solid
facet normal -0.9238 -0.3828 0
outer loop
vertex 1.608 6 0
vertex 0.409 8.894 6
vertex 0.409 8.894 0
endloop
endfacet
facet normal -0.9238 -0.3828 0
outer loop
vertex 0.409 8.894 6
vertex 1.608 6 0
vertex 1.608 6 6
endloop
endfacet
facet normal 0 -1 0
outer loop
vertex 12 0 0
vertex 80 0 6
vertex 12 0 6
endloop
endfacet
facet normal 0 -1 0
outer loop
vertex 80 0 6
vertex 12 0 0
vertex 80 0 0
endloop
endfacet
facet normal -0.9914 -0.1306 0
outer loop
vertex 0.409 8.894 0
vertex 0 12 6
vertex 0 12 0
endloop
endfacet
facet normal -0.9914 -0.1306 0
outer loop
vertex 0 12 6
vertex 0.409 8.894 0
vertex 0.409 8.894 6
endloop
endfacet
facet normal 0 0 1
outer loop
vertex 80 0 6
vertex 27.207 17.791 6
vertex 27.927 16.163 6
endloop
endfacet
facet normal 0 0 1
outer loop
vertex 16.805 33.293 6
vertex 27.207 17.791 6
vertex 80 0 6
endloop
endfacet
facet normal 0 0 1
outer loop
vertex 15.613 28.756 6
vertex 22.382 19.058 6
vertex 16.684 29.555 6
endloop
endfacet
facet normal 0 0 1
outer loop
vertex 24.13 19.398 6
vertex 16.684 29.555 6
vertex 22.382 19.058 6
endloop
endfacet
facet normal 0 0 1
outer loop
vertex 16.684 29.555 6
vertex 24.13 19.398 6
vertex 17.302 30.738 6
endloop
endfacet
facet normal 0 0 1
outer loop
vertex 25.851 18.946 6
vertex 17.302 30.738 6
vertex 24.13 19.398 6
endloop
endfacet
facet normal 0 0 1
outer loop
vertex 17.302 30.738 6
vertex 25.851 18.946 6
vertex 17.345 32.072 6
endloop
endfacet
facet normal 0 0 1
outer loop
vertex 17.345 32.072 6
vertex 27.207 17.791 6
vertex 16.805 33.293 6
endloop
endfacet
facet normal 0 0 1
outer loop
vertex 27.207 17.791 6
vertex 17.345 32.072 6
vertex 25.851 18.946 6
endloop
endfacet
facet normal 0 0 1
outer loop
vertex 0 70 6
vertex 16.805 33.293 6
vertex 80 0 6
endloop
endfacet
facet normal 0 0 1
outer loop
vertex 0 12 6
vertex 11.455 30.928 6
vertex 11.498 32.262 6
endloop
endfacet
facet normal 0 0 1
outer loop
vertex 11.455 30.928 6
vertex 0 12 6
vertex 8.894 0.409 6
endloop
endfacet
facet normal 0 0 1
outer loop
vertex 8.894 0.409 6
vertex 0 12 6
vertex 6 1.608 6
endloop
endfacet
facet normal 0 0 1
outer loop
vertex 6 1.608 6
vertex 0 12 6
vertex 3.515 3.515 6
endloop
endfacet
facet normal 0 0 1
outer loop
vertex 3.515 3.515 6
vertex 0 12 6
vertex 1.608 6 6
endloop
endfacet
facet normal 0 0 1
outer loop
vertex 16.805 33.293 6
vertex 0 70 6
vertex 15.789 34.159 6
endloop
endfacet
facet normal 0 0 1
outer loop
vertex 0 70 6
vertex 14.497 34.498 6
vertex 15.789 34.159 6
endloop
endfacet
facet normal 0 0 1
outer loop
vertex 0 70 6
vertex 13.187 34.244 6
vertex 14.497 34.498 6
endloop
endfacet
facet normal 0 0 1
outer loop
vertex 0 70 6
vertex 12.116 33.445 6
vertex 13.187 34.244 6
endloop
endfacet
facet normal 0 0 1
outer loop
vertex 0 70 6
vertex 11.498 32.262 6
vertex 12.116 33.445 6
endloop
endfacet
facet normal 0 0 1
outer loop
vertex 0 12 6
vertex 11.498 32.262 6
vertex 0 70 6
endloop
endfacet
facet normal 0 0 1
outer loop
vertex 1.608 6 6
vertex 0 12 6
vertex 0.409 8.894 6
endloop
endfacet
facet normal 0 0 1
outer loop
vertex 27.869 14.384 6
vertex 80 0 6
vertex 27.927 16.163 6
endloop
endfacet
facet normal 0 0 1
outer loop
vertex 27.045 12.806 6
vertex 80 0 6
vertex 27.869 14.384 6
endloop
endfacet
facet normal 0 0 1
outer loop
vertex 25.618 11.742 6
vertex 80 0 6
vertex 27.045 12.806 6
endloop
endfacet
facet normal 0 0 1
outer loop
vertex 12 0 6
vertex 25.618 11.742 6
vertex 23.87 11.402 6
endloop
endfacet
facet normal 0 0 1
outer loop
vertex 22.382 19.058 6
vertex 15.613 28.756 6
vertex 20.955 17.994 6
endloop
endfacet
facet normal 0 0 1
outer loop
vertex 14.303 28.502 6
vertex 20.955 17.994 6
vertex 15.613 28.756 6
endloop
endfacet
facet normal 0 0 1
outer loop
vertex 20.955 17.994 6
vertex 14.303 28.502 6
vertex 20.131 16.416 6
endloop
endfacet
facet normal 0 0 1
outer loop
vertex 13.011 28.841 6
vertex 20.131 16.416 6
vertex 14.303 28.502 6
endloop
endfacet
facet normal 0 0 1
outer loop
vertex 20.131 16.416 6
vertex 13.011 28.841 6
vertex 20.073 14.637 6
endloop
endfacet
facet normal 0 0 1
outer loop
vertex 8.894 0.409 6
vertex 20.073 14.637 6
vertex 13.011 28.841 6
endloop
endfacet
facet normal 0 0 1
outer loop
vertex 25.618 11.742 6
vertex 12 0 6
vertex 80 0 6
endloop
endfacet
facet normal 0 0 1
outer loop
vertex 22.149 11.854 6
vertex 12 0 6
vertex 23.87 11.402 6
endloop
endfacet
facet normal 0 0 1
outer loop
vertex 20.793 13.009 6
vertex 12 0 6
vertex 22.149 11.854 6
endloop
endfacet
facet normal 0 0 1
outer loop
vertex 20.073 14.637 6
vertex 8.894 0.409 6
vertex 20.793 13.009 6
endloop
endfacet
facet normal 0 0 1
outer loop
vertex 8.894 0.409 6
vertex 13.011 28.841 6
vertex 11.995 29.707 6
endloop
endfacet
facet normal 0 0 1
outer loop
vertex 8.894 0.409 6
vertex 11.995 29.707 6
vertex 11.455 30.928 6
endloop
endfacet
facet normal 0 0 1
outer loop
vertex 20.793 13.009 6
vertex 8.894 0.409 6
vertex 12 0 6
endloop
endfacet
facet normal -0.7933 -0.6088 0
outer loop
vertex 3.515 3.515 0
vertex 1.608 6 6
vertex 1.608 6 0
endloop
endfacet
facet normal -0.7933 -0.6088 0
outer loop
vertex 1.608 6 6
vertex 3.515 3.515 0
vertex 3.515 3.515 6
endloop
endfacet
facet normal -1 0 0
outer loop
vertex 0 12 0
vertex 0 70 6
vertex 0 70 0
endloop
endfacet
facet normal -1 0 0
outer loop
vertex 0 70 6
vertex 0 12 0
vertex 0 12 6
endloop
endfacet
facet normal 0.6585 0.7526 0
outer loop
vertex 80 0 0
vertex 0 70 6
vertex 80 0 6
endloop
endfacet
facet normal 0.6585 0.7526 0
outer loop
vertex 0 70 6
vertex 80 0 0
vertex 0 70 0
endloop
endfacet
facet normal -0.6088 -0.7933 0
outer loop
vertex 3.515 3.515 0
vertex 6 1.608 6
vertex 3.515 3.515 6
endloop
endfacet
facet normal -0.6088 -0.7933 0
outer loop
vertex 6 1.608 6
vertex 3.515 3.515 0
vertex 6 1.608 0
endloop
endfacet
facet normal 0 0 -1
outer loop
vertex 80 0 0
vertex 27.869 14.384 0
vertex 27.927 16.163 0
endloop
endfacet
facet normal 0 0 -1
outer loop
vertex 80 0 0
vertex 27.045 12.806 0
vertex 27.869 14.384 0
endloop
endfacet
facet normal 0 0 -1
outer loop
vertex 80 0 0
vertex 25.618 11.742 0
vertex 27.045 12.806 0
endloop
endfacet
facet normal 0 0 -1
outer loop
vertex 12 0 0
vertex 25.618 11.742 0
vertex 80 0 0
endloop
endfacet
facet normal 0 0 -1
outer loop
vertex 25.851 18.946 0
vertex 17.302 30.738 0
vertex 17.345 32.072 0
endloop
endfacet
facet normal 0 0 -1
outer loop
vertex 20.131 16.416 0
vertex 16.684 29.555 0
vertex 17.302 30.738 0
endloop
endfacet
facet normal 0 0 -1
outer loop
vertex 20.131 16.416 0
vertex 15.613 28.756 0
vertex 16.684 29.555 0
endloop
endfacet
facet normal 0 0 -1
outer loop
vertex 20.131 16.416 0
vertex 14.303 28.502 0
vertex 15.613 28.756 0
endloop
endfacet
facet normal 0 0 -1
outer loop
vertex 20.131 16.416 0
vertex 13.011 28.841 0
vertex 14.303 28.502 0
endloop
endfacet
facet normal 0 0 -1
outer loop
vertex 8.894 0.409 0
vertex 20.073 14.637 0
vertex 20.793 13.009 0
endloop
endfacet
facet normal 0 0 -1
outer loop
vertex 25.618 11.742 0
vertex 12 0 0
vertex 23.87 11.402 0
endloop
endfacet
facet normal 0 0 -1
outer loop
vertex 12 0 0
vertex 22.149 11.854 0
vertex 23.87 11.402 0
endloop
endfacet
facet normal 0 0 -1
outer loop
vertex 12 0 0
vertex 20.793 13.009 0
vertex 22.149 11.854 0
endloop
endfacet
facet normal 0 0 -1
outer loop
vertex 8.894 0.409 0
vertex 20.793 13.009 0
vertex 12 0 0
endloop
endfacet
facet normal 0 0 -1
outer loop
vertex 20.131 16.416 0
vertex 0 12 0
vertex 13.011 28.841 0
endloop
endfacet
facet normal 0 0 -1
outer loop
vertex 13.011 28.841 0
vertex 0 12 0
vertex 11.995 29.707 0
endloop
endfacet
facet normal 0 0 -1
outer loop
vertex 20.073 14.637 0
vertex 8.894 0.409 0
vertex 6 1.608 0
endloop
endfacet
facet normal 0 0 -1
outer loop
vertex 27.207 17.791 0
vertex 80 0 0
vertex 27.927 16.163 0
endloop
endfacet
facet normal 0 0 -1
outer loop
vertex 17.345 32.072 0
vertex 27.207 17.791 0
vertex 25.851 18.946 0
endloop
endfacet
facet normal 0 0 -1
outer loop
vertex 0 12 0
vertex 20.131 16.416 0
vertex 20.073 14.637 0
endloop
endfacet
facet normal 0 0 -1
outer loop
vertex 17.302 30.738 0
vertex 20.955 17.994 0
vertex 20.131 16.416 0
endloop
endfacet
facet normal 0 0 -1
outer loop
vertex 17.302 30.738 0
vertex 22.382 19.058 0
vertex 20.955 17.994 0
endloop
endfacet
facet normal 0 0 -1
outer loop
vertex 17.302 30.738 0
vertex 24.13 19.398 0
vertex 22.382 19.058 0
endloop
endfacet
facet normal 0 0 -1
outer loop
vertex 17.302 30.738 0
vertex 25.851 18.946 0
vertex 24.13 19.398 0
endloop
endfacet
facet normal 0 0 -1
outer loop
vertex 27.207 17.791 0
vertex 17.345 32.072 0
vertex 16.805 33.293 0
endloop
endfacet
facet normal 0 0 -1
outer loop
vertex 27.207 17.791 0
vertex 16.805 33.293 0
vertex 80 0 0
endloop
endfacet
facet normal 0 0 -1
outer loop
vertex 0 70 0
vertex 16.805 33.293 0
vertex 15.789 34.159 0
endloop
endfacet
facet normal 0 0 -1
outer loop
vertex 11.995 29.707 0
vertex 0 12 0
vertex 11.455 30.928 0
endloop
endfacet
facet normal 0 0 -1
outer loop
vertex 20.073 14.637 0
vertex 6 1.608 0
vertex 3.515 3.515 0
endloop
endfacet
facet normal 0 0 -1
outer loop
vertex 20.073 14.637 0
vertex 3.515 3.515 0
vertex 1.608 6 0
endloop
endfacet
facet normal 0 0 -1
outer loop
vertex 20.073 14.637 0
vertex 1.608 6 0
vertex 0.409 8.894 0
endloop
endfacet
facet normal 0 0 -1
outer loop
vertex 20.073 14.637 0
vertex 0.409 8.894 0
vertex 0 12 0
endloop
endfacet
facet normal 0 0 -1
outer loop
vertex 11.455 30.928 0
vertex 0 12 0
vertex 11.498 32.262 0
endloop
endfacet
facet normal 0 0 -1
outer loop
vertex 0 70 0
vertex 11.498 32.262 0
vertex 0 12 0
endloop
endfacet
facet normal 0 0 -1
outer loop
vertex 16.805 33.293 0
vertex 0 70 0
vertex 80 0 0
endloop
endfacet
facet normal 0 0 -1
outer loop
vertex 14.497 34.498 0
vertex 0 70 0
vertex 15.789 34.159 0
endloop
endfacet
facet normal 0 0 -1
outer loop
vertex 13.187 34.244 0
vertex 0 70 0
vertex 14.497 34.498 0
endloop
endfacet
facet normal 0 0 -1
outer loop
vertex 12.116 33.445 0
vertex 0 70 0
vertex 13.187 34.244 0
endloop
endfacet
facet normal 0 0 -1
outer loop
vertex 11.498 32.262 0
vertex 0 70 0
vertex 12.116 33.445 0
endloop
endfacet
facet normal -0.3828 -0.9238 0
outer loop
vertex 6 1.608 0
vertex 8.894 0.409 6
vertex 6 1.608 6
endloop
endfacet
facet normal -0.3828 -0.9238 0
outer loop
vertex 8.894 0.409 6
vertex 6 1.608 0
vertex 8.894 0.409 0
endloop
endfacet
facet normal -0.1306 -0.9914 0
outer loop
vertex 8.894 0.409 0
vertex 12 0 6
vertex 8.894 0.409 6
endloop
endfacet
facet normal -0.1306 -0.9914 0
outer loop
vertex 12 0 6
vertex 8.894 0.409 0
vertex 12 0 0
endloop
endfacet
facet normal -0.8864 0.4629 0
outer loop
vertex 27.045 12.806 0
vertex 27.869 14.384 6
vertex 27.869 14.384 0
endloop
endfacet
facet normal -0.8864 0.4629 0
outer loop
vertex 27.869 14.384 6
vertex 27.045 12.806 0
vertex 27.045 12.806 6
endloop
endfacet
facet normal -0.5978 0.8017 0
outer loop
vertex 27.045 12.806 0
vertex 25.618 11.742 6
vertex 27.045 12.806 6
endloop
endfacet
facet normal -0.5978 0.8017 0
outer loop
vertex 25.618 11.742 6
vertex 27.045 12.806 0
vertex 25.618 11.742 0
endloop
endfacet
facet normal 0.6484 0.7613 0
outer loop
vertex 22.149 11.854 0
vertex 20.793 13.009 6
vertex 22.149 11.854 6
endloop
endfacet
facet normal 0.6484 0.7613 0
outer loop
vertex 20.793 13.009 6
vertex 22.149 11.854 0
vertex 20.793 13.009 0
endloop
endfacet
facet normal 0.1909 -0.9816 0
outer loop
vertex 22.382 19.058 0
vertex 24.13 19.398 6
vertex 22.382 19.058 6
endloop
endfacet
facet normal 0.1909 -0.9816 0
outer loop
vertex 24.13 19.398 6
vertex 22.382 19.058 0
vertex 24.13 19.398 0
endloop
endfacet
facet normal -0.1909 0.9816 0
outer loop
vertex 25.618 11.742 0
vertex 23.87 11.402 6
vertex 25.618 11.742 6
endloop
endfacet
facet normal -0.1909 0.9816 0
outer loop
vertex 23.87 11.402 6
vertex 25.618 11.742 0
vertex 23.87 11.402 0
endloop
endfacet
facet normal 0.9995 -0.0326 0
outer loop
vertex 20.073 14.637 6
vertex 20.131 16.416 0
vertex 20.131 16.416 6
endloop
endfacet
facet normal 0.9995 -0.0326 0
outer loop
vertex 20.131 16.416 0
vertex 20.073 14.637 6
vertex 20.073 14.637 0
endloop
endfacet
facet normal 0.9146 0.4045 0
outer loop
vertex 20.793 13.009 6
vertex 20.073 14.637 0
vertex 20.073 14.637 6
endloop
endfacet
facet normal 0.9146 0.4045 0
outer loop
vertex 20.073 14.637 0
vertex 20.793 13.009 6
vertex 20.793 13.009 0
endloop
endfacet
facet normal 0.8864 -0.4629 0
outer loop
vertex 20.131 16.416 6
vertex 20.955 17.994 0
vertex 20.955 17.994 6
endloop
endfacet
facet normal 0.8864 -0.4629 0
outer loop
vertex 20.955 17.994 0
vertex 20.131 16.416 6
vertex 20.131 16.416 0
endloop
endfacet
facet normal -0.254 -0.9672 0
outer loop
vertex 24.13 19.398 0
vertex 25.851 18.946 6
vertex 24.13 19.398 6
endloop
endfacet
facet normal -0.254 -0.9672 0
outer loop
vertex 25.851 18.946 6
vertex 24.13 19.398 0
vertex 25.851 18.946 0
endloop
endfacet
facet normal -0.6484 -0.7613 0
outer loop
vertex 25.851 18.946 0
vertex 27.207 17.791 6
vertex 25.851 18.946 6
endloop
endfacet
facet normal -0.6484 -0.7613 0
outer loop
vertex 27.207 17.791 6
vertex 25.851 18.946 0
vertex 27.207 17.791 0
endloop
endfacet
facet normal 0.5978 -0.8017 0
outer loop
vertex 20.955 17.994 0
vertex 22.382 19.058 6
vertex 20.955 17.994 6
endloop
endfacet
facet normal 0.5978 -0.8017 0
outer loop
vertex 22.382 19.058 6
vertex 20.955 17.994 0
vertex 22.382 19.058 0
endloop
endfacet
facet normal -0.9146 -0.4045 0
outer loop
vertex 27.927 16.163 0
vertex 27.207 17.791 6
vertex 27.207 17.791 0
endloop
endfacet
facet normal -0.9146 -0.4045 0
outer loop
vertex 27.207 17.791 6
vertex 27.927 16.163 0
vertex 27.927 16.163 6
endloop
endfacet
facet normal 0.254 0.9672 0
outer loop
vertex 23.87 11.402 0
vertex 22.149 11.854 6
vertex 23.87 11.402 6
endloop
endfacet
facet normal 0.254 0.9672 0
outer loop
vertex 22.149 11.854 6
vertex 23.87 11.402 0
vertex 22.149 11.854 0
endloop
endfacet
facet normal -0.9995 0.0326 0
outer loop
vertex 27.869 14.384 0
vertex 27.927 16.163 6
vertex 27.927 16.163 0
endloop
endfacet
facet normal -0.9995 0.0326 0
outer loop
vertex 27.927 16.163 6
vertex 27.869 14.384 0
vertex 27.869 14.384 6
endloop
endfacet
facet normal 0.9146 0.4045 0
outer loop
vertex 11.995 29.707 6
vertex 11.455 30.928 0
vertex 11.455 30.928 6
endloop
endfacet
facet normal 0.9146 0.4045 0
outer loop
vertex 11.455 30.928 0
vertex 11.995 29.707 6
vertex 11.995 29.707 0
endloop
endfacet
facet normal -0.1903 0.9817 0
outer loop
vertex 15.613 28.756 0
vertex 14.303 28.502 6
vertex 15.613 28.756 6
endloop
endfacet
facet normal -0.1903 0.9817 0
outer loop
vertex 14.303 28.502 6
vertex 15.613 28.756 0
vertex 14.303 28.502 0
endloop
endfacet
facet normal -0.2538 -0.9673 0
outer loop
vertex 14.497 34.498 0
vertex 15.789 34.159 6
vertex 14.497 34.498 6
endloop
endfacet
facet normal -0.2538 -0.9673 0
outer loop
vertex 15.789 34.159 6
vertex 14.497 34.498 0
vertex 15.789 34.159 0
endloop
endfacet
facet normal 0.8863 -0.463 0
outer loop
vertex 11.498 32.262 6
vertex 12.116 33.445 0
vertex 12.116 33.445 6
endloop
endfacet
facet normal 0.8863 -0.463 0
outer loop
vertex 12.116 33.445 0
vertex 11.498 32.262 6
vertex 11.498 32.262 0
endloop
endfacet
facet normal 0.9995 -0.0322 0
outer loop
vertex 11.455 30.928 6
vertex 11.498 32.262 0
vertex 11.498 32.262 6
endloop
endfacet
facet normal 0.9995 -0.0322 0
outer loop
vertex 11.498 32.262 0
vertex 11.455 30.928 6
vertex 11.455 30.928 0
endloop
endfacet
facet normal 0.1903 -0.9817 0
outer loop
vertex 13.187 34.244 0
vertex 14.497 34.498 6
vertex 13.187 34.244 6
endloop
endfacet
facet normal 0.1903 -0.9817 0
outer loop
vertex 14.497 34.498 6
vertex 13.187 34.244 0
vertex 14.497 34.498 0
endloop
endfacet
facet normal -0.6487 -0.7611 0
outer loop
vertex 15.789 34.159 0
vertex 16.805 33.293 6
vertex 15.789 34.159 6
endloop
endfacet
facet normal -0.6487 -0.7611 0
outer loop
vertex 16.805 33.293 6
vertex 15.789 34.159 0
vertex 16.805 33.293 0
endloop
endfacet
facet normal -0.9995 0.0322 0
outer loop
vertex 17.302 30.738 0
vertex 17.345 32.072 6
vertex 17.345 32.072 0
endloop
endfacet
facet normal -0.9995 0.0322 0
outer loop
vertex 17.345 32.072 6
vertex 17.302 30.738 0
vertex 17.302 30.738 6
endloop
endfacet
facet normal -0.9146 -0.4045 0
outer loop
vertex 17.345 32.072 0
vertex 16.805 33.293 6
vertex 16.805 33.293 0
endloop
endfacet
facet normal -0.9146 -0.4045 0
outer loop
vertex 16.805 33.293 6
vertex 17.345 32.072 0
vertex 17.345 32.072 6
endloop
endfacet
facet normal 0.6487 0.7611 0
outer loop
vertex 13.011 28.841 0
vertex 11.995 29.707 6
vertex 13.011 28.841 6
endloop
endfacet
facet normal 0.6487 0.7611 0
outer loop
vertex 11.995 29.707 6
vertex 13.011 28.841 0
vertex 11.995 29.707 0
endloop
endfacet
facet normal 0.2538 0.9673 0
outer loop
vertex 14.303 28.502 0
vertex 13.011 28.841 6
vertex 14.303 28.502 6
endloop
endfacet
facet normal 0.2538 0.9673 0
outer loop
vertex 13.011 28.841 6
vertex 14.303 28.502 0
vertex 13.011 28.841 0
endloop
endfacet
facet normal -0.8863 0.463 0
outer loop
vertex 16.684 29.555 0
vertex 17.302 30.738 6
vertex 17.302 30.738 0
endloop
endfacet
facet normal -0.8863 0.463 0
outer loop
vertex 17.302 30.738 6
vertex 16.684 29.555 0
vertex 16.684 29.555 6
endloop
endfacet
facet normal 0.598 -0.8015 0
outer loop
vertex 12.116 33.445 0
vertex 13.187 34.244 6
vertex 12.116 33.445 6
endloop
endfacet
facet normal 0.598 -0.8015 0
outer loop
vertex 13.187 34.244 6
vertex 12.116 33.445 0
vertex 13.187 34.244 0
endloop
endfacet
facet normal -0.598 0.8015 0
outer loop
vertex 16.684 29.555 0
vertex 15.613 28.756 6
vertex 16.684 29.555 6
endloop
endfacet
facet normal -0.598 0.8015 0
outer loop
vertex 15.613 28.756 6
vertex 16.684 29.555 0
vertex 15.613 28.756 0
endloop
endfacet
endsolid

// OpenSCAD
$fn = 32;

// ----------------------------------------------------------------------
// Bracket plate: corner pad 80 x 70, fillet R12
// ----------------------------------------------------------------------

// --- parameters (mm) ---
hole_r = 3;               // bolt hole radius
plate_t = 6;              // plate thickness, Z (extrusion height)
leg_a = 80;               // base leg
leg_b = 70;               // height leg
fillet_r = 12;            // right-angle fillet radius

hole_d1 = 2 * hole_r + 2;
hole_d2 = 2 * hole_r;

profile = [[12, 0], [80, 0], [0, 70], [0, 12], [0.409, 8.894], [1.608, 6], [3.515, 3.515], [6, 1.608], [8.894, 0.409]];  // primary outline, 9 points, counter clockwise
void_1 = [[27.927, 16.163], [27.207, 17.791], [25.851, 18.946], [24.13, 19.398], [22.382, 19.058], [20.955, 17.994], [20.131, 16.416], [20.073, 14.637], [20.793, 13.009], [22.149, 11.854], [23.87, 11.402], [25.618, 11.742], [27.045, 12.806], [27.869, 14.384]];  // mount hole 1, 14 points
void_2 = [[17.345, 32.072], [16.805, 33.293], [15.789, 34.159], [14.497, 34.498], [13.187, 34.244], [12.116, 33.445], [11.498, 32.262], [11.455, 30.928], [11.995, 29.707], [13.011, 28.841], [14.303, 28.502], [15.613, 28.756], [16.684, 29.555], [17.302, 30.738]];  // mount hole 2, 14 points

// --- the one profile operation ---
difference() {
  linear_extrude(height = plate_t) polygon(points = profile);
  translate([0, 0, -1])
    linear_extrude(height = plate_t + 2) polygon(points = void_1);
  translate([0, 0, -1])
    linear_extrude(height = plate_t + 2) polygon(points = void_2);
}
